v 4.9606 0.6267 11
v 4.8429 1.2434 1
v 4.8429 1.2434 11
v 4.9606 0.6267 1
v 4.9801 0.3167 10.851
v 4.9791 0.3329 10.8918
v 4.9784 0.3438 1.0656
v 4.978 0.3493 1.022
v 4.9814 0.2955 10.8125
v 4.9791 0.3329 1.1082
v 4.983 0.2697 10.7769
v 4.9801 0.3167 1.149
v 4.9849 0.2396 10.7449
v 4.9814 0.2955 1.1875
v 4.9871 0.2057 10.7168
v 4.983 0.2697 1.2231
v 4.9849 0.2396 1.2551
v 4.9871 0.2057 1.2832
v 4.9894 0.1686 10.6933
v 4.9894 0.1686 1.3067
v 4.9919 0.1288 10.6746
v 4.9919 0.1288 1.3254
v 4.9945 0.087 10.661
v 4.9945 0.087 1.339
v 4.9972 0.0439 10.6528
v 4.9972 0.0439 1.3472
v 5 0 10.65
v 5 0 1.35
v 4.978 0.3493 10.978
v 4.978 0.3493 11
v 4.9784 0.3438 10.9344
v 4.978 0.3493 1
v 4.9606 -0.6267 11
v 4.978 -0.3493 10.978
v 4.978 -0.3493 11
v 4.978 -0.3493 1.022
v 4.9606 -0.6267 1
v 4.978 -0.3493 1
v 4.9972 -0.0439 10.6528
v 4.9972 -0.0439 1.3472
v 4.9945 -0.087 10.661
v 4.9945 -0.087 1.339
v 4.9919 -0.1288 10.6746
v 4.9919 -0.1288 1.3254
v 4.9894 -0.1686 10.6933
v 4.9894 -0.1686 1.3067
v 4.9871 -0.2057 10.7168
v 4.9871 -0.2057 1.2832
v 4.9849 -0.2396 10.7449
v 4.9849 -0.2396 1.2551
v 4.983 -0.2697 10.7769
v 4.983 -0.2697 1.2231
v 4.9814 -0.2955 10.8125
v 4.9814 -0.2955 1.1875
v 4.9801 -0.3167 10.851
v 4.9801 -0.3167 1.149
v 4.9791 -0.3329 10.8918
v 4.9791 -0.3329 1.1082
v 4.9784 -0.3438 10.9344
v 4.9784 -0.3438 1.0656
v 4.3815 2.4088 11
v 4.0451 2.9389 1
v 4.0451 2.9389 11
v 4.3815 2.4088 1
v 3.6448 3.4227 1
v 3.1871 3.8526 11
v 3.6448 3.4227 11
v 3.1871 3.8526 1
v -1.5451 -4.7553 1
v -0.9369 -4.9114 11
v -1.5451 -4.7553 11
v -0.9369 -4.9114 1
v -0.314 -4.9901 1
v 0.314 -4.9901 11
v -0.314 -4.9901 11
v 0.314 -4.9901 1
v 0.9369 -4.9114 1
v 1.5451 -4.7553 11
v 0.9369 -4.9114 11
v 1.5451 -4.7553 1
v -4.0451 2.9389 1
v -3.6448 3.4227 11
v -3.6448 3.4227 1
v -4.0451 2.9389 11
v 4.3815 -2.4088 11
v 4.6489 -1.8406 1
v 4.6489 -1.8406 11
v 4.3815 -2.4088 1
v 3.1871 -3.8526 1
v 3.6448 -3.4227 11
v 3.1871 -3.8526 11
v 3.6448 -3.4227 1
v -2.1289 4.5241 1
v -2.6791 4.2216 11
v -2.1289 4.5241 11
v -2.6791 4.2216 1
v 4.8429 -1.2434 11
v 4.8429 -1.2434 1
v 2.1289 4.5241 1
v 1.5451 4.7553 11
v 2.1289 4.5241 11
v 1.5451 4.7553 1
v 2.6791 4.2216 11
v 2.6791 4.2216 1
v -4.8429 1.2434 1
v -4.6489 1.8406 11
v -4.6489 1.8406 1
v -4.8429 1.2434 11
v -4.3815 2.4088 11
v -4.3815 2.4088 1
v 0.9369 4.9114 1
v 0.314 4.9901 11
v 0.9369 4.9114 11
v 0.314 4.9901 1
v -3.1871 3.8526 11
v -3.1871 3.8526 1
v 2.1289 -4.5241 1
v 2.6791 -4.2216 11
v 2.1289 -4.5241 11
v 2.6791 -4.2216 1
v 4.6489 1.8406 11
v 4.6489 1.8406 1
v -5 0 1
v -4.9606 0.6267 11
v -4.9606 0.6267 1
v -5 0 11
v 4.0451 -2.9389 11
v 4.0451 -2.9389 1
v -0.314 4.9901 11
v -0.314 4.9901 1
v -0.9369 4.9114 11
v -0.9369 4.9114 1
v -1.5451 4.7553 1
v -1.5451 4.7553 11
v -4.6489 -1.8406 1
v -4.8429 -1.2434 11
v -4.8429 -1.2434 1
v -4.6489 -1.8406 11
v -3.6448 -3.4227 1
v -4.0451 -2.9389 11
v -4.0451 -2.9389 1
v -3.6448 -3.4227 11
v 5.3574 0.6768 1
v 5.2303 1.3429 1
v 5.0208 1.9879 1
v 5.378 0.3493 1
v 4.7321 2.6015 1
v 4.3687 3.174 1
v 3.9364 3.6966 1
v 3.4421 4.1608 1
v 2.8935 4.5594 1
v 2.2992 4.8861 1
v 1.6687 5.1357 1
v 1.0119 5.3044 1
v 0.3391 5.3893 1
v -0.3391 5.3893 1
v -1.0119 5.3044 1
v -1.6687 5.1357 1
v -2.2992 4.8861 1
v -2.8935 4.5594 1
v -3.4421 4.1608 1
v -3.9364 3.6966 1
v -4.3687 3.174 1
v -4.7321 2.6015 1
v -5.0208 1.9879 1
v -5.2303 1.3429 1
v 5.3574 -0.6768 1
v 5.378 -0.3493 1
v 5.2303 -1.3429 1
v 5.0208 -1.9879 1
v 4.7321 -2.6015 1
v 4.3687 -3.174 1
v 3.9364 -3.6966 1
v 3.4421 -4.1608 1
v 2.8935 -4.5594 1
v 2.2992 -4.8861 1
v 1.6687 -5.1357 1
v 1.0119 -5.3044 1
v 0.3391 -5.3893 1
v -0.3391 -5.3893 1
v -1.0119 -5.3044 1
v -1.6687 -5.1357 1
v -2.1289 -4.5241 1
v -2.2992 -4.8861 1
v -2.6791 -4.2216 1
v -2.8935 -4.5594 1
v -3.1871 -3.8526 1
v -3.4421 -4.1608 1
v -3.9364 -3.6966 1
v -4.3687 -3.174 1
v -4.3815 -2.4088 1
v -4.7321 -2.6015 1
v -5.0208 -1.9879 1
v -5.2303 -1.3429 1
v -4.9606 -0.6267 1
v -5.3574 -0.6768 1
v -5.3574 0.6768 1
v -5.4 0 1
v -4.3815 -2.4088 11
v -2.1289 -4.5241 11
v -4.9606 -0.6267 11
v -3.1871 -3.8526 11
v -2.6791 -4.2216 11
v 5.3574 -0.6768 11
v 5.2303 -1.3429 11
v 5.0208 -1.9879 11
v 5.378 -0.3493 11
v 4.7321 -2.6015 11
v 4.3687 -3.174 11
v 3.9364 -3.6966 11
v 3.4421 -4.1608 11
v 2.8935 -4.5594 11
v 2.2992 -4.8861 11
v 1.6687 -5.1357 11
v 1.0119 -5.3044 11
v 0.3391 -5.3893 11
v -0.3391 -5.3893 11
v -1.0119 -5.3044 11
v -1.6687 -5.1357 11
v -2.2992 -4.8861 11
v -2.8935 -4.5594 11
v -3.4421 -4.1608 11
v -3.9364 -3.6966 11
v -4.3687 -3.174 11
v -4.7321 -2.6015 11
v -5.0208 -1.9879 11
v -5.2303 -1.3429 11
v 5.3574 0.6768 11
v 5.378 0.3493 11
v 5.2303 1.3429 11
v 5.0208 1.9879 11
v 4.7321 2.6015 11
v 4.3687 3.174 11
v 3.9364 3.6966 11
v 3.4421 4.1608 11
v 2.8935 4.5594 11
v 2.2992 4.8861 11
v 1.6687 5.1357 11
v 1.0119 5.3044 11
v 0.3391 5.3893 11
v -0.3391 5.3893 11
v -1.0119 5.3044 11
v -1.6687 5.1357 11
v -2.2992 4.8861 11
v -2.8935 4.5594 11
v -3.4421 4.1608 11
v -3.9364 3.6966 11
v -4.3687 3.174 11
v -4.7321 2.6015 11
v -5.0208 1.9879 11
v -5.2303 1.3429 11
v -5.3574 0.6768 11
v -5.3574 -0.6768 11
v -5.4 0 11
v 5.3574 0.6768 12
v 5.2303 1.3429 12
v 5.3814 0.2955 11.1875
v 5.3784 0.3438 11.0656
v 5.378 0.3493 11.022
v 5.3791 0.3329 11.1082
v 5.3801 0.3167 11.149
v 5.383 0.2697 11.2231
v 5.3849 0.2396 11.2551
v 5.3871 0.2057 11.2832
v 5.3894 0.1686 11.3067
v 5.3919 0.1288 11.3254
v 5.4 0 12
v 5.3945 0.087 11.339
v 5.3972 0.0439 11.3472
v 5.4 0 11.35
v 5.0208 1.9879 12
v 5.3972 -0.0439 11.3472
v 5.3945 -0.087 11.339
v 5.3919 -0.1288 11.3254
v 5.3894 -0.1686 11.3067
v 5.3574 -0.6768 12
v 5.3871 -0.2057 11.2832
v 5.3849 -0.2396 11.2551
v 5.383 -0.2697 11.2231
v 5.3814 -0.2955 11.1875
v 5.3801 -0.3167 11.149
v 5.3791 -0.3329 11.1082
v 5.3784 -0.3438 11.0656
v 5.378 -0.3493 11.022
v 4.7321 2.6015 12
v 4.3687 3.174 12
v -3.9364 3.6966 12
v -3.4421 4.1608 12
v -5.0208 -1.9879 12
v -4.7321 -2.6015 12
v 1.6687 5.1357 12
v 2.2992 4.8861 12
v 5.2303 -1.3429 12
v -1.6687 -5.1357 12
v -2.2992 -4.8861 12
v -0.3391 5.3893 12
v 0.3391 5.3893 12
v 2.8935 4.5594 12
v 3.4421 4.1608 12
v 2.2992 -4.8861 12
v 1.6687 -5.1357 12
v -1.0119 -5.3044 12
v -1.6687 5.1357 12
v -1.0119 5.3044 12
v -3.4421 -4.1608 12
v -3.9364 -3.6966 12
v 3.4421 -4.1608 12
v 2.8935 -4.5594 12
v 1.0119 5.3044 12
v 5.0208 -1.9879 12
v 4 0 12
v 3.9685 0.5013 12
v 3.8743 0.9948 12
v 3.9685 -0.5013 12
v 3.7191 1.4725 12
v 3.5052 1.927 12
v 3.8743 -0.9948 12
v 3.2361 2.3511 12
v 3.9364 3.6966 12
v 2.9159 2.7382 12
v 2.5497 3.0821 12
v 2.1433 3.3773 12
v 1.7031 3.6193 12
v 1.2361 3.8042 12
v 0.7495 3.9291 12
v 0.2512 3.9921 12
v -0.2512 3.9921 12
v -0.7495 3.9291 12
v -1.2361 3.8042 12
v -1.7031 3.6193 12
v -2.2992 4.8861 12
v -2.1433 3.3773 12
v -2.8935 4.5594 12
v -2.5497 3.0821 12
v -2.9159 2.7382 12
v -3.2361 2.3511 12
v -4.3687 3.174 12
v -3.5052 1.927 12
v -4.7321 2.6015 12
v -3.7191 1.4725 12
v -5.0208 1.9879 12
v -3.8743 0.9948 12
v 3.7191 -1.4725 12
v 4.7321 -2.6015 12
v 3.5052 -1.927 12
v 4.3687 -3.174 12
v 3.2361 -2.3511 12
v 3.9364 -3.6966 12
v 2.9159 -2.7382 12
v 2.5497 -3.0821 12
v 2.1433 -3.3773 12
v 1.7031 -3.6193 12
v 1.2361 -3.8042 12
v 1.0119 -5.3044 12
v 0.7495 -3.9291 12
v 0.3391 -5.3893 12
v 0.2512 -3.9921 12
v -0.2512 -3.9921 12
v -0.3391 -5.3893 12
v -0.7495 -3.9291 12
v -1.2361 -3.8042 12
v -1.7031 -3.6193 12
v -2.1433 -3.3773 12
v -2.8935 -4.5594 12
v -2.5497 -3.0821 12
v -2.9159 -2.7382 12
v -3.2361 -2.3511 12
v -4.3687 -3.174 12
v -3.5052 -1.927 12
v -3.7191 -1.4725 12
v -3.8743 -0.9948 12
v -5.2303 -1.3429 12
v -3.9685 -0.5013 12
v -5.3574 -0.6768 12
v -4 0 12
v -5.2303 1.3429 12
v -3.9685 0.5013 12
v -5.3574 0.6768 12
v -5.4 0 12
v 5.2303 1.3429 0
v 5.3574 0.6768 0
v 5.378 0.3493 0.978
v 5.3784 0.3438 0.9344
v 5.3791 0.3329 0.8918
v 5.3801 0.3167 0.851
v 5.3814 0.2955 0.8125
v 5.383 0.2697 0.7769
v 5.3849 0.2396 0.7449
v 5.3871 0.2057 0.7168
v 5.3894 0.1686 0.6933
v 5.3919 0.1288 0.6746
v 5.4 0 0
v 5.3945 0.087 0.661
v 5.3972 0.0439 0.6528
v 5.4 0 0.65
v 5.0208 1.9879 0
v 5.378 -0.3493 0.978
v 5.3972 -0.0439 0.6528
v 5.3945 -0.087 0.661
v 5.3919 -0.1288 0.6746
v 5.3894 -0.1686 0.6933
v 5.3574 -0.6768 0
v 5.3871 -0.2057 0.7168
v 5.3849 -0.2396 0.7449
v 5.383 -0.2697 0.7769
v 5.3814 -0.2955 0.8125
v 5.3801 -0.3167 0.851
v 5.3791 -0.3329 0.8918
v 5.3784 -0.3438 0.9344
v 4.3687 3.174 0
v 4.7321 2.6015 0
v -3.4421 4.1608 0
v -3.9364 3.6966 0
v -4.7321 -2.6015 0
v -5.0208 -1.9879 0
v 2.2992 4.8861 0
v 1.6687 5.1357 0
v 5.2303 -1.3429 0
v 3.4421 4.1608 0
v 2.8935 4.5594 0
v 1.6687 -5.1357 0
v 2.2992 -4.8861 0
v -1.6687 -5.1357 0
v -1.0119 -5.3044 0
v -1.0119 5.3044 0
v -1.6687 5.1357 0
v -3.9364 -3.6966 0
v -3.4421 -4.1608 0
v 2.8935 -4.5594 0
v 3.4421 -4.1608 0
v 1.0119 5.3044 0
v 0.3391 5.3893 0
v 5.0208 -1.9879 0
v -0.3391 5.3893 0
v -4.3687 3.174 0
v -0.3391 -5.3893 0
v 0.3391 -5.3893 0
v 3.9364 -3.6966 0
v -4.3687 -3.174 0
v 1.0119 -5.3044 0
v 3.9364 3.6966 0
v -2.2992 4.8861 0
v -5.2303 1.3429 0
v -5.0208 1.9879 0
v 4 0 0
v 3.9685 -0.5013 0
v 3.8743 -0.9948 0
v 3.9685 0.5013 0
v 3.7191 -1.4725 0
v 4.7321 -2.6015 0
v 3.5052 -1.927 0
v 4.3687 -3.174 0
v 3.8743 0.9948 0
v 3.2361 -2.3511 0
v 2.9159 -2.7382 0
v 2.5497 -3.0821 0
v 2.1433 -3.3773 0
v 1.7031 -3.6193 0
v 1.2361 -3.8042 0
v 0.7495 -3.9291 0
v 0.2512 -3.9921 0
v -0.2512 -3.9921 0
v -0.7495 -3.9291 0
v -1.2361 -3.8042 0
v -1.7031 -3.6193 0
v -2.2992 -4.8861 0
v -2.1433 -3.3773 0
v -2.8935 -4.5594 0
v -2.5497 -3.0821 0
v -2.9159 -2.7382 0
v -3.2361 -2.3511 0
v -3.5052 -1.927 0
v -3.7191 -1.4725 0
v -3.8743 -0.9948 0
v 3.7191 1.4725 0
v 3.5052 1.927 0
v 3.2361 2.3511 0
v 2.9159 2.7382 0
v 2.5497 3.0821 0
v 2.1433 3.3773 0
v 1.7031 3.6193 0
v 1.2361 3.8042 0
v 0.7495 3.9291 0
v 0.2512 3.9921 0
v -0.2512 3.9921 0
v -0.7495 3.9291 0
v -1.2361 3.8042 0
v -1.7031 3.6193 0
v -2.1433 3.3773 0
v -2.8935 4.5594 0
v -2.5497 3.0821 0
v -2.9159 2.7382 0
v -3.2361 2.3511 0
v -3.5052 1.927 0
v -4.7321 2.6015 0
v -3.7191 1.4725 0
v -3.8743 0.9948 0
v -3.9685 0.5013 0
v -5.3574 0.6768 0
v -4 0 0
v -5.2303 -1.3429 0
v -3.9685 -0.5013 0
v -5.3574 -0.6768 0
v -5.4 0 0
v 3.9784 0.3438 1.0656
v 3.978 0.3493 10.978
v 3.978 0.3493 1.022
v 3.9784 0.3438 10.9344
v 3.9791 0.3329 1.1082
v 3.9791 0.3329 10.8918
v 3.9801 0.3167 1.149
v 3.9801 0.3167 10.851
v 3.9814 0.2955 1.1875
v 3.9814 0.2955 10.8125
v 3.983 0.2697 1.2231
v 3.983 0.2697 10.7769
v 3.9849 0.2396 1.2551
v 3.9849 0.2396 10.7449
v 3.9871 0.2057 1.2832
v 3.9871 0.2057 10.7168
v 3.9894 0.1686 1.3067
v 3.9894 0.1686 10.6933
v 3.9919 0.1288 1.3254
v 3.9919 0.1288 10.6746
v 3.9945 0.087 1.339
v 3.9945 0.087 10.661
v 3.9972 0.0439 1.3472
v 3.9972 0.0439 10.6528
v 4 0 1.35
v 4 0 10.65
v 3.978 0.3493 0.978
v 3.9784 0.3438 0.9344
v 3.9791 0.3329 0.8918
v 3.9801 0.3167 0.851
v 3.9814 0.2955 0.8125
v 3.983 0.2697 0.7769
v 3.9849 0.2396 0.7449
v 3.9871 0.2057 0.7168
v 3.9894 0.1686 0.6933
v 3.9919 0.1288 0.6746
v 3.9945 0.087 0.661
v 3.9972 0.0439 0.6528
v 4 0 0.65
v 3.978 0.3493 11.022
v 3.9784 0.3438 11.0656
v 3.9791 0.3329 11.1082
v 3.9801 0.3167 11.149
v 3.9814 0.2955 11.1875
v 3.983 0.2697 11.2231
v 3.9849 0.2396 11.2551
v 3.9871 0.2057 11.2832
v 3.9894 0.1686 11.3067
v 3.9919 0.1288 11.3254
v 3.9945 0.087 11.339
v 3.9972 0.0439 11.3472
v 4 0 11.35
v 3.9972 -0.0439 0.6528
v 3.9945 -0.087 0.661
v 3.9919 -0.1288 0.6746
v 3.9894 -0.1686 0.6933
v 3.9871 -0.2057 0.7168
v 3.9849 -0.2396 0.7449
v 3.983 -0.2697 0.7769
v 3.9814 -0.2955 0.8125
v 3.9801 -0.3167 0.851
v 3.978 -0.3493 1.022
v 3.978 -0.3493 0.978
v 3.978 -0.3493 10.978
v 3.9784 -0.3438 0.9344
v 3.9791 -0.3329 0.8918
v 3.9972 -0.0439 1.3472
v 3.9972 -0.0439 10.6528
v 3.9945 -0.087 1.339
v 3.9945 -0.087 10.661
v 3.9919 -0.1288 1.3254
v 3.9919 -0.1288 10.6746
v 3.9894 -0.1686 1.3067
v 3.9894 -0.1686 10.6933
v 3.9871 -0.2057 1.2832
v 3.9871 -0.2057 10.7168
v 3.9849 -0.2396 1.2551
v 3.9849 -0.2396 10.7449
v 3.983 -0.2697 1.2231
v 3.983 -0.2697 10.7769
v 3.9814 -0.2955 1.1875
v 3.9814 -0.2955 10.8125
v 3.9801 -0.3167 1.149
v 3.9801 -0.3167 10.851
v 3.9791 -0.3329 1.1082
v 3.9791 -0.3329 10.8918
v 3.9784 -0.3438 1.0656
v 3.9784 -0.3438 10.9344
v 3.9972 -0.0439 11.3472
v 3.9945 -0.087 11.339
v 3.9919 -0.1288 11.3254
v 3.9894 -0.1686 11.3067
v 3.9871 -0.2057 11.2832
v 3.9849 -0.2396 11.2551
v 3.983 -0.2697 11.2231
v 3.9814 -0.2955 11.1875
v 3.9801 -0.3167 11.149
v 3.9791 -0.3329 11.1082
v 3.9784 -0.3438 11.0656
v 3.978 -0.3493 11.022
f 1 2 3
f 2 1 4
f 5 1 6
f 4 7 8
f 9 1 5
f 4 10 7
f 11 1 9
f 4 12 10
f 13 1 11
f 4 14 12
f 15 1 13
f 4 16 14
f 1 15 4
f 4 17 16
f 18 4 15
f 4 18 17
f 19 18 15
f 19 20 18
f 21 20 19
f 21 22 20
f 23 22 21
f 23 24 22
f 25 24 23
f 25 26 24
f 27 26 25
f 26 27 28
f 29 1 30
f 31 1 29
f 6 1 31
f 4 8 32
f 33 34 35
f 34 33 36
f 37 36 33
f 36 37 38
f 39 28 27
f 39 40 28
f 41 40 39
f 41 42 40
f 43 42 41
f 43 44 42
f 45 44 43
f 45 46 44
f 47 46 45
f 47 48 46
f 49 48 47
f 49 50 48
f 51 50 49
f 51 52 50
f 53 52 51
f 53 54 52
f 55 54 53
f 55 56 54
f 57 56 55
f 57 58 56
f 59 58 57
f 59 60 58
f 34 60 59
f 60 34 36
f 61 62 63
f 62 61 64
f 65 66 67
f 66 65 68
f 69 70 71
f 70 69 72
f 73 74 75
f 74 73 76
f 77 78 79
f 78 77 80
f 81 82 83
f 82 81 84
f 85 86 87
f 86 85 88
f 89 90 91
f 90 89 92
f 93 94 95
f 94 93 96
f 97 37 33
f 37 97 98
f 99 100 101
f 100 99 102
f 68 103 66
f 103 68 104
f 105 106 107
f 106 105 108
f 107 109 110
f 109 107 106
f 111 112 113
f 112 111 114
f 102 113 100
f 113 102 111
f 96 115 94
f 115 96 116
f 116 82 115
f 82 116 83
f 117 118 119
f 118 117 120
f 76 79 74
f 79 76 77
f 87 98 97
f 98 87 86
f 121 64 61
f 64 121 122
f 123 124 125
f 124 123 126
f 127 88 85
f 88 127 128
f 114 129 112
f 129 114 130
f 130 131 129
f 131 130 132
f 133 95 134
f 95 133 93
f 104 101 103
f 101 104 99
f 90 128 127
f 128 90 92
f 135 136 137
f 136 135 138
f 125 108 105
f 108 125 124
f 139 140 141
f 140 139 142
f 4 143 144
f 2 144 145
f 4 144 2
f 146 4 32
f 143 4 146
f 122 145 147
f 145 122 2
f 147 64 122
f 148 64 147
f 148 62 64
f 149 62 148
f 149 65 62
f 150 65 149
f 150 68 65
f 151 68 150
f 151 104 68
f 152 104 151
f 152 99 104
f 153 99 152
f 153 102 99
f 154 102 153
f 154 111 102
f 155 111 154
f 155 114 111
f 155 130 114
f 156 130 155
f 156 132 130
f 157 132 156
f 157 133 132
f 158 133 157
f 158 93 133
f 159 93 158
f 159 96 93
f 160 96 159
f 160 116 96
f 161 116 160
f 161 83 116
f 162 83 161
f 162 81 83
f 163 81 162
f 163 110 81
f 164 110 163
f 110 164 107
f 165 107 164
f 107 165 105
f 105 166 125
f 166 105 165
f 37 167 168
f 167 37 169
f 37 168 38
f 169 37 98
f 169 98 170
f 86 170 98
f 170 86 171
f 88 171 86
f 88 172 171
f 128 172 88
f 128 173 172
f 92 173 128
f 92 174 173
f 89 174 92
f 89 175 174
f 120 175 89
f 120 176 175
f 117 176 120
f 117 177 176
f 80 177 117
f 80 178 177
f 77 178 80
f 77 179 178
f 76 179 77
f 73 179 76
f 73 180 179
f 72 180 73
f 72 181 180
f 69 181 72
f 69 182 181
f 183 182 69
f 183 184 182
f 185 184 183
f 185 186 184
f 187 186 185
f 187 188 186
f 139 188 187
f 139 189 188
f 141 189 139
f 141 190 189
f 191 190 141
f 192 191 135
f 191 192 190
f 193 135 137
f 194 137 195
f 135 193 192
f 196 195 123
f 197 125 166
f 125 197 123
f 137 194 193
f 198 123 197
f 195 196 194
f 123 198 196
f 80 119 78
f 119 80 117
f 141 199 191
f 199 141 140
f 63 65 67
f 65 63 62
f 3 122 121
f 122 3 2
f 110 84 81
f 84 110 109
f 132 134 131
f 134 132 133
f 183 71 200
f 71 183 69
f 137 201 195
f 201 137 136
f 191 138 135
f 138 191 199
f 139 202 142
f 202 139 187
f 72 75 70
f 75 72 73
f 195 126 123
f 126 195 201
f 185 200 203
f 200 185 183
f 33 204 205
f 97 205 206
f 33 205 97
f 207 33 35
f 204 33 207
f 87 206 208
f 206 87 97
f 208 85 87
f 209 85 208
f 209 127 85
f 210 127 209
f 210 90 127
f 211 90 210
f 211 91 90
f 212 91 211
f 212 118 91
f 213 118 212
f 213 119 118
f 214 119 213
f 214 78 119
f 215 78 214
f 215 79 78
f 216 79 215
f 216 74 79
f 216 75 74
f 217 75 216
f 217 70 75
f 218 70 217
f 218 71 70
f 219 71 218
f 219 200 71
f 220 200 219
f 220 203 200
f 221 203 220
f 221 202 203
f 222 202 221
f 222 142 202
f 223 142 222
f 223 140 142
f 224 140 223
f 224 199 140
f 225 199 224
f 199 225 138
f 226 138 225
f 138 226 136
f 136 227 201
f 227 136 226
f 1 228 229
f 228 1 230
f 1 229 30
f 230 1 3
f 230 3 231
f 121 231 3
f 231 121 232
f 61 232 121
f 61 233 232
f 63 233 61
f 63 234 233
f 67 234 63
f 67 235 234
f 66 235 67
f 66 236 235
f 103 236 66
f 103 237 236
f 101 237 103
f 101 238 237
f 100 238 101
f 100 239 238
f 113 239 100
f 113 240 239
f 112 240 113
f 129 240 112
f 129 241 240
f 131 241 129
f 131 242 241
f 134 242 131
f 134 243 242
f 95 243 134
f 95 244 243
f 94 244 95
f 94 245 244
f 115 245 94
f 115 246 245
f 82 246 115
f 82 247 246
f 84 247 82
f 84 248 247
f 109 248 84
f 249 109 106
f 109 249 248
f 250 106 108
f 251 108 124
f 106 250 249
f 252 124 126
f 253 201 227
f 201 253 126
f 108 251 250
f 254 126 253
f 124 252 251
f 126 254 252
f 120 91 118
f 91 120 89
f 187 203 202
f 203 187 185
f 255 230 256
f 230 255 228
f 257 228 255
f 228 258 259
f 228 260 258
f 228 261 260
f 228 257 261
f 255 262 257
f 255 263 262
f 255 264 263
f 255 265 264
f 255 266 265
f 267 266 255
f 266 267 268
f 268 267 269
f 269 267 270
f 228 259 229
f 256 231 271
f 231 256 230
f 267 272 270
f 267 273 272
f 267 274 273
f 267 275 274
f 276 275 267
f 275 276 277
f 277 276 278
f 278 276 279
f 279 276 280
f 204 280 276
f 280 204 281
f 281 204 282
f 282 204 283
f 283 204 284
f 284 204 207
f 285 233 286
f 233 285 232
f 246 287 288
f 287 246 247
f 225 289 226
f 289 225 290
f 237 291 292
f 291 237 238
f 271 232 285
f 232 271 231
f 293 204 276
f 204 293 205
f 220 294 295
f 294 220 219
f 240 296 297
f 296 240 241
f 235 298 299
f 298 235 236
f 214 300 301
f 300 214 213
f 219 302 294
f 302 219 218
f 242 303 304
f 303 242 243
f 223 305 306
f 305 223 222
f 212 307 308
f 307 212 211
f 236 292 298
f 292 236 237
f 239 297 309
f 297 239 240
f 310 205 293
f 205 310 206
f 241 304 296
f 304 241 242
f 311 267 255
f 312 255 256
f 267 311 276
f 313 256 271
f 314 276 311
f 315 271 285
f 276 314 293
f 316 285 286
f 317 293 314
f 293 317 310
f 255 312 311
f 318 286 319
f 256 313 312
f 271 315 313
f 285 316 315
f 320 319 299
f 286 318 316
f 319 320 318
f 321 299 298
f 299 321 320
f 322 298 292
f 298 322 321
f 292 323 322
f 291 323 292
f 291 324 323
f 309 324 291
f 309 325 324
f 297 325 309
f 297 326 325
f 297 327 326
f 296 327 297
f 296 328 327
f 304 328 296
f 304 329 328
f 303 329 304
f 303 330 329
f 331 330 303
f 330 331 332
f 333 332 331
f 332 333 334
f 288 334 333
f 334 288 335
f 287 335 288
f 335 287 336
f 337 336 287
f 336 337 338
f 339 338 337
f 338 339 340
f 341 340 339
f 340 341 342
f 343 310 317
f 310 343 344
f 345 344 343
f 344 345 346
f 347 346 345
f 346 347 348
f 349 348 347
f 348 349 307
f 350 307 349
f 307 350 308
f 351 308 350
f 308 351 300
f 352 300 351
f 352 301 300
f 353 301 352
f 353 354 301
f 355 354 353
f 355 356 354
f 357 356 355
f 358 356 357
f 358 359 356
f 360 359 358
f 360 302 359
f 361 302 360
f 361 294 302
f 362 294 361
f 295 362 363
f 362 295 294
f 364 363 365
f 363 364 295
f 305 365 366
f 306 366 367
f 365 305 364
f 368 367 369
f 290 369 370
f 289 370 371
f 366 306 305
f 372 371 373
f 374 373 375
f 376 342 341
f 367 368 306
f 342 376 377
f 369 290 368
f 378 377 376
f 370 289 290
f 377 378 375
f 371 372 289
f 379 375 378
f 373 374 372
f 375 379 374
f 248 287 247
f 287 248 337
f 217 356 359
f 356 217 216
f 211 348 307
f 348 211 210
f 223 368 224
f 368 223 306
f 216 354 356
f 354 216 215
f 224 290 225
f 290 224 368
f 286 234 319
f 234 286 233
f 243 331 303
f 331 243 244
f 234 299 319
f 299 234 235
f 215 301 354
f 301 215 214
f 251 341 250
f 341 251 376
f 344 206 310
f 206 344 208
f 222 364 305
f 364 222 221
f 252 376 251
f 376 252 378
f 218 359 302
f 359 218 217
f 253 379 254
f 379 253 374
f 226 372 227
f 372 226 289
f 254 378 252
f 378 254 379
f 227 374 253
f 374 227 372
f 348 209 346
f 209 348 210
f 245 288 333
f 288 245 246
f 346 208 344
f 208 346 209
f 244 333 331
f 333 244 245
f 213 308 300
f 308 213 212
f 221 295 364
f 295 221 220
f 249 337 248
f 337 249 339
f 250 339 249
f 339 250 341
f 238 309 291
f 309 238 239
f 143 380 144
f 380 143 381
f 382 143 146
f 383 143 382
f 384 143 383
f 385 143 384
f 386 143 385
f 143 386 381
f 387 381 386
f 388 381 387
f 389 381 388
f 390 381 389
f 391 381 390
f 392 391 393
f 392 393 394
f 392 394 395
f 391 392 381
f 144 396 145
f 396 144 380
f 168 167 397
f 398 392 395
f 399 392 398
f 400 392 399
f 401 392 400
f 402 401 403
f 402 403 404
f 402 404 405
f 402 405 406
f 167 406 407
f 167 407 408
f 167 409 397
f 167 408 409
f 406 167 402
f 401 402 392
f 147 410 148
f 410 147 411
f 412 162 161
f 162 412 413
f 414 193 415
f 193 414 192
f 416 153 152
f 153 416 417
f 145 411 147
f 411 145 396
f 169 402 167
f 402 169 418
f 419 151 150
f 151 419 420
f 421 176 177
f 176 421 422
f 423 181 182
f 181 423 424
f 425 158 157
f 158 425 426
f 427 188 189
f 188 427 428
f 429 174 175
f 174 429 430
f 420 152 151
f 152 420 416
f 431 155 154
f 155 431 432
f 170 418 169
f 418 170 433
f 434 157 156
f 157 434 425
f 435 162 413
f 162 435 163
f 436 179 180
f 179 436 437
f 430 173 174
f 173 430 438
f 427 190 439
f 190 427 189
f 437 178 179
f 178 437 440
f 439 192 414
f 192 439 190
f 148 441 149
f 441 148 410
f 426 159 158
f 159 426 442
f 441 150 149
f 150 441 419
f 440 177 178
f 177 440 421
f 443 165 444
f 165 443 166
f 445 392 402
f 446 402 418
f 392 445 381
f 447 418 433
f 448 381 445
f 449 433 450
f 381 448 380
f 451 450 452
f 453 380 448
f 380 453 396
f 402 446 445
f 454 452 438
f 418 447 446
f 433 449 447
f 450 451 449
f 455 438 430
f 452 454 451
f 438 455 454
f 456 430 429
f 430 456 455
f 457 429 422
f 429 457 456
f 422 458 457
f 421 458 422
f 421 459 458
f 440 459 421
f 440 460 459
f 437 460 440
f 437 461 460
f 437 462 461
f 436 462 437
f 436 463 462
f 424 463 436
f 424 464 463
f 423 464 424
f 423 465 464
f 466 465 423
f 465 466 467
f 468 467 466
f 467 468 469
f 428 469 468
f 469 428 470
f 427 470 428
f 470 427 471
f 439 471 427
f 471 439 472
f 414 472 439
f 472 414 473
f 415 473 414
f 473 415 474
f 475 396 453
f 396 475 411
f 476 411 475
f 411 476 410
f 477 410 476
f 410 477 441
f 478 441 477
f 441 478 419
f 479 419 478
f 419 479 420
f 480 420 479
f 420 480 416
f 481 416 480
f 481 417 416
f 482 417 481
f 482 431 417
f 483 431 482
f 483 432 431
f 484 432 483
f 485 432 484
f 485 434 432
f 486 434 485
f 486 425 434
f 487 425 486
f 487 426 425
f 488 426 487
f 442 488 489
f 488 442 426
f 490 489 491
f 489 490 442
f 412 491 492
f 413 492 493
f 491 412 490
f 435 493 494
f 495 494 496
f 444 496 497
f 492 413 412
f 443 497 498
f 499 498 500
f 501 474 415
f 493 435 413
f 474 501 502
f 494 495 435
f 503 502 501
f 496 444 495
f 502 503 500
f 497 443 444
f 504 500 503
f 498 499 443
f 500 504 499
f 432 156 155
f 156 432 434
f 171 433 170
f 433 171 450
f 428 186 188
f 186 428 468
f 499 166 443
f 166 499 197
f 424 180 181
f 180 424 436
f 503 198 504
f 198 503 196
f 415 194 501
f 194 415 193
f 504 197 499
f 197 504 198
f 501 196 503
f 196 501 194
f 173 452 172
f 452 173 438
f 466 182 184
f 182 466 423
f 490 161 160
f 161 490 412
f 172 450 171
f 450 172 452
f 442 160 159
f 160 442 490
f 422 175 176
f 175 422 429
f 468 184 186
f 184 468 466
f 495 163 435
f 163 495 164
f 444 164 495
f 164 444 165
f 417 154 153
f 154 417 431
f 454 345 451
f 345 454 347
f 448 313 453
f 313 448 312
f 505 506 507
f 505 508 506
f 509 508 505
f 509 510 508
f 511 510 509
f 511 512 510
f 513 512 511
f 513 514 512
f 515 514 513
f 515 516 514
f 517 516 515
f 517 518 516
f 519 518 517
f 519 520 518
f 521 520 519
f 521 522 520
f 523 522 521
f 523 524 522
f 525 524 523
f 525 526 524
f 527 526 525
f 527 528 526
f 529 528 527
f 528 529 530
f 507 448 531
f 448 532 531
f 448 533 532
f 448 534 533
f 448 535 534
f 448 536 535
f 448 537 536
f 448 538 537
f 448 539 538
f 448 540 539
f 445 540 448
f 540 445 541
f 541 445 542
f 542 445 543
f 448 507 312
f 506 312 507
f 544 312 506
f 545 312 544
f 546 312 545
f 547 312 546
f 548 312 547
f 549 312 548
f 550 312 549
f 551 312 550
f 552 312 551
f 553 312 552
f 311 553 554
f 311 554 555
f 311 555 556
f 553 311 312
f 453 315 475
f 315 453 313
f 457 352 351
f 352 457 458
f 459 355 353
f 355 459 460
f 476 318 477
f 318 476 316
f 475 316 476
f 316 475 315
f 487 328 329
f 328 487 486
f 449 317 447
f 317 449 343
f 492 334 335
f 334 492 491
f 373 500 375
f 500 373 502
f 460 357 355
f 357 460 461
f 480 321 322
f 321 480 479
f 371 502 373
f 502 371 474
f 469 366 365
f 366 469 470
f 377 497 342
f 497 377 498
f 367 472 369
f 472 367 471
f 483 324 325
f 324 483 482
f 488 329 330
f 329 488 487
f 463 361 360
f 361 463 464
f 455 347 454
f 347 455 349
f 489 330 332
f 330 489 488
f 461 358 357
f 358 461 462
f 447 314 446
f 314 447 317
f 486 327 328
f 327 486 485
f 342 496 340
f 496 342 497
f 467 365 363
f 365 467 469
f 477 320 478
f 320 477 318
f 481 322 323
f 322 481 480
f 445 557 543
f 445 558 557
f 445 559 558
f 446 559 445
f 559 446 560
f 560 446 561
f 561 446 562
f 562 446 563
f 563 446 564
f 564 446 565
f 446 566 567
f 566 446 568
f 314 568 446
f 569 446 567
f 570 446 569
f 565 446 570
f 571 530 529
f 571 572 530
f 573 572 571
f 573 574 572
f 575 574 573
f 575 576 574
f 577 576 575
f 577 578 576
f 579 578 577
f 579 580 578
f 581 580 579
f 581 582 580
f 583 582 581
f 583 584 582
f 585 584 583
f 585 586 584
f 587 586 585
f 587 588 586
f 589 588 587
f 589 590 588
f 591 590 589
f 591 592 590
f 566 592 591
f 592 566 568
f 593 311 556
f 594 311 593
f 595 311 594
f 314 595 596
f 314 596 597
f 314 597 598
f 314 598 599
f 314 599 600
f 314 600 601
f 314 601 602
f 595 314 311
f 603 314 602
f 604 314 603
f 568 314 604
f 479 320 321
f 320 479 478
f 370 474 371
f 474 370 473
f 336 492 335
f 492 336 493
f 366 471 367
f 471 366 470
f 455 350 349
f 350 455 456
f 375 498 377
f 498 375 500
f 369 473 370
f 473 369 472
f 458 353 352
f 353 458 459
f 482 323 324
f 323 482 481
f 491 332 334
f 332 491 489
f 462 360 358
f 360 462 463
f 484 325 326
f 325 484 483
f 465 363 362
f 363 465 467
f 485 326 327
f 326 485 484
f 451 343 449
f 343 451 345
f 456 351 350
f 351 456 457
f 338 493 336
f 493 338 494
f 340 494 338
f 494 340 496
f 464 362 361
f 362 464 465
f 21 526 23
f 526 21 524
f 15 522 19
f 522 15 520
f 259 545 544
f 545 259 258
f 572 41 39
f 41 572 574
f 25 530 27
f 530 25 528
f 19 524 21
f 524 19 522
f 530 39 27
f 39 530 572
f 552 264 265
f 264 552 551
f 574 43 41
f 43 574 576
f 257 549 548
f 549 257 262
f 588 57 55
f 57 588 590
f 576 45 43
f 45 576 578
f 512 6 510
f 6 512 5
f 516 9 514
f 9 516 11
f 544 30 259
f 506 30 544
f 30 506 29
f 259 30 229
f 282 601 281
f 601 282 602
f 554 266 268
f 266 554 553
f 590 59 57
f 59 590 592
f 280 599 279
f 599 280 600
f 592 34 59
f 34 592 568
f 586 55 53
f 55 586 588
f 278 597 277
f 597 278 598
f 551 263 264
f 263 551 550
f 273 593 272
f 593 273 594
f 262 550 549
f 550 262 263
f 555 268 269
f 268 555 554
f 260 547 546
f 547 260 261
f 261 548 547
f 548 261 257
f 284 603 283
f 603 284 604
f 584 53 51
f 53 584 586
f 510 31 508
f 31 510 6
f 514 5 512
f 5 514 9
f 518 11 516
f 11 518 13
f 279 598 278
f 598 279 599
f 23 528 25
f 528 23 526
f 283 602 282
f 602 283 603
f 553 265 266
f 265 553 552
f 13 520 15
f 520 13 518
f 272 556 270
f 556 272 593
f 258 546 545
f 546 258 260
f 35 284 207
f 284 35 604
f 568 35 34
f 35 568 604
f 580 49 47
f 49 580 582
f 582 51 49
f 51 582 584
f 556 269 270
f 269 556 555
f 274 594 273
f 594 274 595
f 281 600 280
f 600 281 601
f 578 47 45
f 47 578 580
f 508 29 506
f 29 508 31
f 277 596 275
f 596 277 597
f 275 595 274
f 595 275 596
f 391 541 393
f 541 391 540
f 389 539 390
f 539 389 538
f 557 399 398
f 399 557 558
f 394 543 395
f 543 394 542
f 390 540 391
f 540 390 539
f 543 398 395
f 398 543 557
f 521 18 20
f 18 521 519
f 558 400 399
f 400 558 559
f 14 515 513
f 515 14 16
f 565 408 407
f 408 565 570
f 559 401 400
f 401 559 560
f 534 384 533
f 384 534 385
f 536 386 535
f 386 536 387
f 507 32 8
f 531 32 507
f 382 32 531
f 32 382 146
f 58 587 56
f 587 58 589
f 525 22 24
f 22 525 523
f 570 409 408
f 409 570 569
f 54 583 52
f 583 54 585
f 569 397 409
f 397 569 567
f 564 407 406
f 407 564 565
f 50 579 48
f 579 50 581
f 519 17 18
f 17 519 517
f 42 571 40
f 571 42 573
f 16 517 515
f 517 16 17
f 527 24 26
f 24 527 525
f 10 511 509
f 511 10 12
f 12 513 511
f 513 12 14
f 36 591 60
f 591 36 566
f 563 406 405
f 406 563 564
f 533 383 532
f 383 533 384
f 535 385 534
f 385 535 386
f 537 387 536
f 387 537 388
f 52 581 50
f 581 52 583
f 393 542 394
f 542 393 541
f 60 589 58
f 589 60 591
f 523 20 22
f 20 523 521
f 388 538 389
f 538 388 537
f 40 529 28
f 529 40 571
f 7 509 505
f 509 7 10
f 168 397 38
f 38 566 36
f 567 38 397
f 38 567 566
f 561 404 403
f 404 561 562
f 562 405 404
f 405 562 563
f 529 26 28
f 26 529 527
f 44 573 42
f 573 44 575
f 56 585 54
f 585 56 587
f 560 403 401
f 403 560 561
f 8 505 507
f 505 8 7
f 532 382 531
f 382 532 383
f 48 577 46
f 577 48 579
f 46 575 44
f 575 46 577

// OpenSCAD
//this is to build a straight open air coil inductor.

/* [Size] */

diameter = 10;
length = 10;
thickness = 1;
segments = 50;

/* [Lip] */

lip_width = 1;
lip_offset = 0.4;

/* [Holes] */

hole_upper = "yes"; //[yes, no]
hole_lower = "yes"; //[yes, no]
hole_diameter = 0.7;

/* [Hidden] */

$fn = segments;

//build
difference() {
	OuterCoil();
    InnerCoil();
    
    if(hole_upper == "yes") {
        Hole([0, 0, lip_width + length]);
    }
    
    if(hole_lower == "yes") {
        Hole([0, 0, lip_width]);
    }
}

//modules
module OuterCoil() {
	union() {
		//base lip
		cylinder (
			h = lip_width, 
			d = lip_offset * 2 + diameter,
			center = false);

		translate ([0, 0, lip_width]) {
			//coil holder
			cylinder (
				h = length, 
				d = diameter,
				center = false);

			translate ([0, 0, length]) {
				//top lip
				cylinder (
					h = lip_width, 
					d = lip_offset * 2 + diameter,
					center = false);
			}	
		}
	}
}

module InnerCoil() {
    translate ([0, 0, -1]) {
        cylinder (
        h = lip_width * 2 + length + 2, 
        d = diameter - thickness * 2,
        center = false);
    }
}

module Hole(pos=[0, 0, 0]) {
    translate(pos) {
        rotate([0, 90, 0]) {
            cylinder (
                h = lip_width * 2 + diameter, 
                d = hole_diameter,
                center = false);
        }
    }
}
